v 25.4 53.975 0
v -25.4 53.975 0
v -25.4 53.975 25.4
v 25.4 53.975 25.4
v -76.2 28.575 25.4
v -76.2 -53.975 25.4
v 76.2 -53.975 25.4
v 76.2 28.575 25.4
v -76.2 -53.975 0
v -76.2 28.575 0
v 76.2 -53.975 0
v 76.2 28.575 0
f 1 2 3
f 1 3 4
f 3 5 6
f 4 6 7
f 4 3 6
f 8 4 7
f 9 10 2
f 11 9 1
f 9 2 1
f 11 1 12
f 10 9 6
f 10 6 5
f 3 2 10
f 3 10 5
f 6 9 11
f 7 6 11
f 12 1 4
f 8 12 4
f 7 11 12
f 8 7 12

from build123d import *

# Parameters (mm, degrees)
F0_W     = 152.4
F0_H     = 107.95
F1_DEPTH = 25.4
F2_SIZE2 = 50.8
F2_SIZE  = 25.4


with BuildPart() as f1:
    # F0 (on Top) → F1 (new body)
    with BuildSketch(Plane.XY):
        Rectangle(F0_W, F0_H)
    extrude(amount=F1_DEPTH)

    # F2
    f2_edges = [f1.edges().sort_by_distance(p)[0] for p in [
        (-76.2, 53.975, 12.7),
        (76.2, 53.975, 12.7),
    ]]
    chamfer(f2_edges, length=F2_SIZE, length2=F2_SIZE2)


solid = f1.part
